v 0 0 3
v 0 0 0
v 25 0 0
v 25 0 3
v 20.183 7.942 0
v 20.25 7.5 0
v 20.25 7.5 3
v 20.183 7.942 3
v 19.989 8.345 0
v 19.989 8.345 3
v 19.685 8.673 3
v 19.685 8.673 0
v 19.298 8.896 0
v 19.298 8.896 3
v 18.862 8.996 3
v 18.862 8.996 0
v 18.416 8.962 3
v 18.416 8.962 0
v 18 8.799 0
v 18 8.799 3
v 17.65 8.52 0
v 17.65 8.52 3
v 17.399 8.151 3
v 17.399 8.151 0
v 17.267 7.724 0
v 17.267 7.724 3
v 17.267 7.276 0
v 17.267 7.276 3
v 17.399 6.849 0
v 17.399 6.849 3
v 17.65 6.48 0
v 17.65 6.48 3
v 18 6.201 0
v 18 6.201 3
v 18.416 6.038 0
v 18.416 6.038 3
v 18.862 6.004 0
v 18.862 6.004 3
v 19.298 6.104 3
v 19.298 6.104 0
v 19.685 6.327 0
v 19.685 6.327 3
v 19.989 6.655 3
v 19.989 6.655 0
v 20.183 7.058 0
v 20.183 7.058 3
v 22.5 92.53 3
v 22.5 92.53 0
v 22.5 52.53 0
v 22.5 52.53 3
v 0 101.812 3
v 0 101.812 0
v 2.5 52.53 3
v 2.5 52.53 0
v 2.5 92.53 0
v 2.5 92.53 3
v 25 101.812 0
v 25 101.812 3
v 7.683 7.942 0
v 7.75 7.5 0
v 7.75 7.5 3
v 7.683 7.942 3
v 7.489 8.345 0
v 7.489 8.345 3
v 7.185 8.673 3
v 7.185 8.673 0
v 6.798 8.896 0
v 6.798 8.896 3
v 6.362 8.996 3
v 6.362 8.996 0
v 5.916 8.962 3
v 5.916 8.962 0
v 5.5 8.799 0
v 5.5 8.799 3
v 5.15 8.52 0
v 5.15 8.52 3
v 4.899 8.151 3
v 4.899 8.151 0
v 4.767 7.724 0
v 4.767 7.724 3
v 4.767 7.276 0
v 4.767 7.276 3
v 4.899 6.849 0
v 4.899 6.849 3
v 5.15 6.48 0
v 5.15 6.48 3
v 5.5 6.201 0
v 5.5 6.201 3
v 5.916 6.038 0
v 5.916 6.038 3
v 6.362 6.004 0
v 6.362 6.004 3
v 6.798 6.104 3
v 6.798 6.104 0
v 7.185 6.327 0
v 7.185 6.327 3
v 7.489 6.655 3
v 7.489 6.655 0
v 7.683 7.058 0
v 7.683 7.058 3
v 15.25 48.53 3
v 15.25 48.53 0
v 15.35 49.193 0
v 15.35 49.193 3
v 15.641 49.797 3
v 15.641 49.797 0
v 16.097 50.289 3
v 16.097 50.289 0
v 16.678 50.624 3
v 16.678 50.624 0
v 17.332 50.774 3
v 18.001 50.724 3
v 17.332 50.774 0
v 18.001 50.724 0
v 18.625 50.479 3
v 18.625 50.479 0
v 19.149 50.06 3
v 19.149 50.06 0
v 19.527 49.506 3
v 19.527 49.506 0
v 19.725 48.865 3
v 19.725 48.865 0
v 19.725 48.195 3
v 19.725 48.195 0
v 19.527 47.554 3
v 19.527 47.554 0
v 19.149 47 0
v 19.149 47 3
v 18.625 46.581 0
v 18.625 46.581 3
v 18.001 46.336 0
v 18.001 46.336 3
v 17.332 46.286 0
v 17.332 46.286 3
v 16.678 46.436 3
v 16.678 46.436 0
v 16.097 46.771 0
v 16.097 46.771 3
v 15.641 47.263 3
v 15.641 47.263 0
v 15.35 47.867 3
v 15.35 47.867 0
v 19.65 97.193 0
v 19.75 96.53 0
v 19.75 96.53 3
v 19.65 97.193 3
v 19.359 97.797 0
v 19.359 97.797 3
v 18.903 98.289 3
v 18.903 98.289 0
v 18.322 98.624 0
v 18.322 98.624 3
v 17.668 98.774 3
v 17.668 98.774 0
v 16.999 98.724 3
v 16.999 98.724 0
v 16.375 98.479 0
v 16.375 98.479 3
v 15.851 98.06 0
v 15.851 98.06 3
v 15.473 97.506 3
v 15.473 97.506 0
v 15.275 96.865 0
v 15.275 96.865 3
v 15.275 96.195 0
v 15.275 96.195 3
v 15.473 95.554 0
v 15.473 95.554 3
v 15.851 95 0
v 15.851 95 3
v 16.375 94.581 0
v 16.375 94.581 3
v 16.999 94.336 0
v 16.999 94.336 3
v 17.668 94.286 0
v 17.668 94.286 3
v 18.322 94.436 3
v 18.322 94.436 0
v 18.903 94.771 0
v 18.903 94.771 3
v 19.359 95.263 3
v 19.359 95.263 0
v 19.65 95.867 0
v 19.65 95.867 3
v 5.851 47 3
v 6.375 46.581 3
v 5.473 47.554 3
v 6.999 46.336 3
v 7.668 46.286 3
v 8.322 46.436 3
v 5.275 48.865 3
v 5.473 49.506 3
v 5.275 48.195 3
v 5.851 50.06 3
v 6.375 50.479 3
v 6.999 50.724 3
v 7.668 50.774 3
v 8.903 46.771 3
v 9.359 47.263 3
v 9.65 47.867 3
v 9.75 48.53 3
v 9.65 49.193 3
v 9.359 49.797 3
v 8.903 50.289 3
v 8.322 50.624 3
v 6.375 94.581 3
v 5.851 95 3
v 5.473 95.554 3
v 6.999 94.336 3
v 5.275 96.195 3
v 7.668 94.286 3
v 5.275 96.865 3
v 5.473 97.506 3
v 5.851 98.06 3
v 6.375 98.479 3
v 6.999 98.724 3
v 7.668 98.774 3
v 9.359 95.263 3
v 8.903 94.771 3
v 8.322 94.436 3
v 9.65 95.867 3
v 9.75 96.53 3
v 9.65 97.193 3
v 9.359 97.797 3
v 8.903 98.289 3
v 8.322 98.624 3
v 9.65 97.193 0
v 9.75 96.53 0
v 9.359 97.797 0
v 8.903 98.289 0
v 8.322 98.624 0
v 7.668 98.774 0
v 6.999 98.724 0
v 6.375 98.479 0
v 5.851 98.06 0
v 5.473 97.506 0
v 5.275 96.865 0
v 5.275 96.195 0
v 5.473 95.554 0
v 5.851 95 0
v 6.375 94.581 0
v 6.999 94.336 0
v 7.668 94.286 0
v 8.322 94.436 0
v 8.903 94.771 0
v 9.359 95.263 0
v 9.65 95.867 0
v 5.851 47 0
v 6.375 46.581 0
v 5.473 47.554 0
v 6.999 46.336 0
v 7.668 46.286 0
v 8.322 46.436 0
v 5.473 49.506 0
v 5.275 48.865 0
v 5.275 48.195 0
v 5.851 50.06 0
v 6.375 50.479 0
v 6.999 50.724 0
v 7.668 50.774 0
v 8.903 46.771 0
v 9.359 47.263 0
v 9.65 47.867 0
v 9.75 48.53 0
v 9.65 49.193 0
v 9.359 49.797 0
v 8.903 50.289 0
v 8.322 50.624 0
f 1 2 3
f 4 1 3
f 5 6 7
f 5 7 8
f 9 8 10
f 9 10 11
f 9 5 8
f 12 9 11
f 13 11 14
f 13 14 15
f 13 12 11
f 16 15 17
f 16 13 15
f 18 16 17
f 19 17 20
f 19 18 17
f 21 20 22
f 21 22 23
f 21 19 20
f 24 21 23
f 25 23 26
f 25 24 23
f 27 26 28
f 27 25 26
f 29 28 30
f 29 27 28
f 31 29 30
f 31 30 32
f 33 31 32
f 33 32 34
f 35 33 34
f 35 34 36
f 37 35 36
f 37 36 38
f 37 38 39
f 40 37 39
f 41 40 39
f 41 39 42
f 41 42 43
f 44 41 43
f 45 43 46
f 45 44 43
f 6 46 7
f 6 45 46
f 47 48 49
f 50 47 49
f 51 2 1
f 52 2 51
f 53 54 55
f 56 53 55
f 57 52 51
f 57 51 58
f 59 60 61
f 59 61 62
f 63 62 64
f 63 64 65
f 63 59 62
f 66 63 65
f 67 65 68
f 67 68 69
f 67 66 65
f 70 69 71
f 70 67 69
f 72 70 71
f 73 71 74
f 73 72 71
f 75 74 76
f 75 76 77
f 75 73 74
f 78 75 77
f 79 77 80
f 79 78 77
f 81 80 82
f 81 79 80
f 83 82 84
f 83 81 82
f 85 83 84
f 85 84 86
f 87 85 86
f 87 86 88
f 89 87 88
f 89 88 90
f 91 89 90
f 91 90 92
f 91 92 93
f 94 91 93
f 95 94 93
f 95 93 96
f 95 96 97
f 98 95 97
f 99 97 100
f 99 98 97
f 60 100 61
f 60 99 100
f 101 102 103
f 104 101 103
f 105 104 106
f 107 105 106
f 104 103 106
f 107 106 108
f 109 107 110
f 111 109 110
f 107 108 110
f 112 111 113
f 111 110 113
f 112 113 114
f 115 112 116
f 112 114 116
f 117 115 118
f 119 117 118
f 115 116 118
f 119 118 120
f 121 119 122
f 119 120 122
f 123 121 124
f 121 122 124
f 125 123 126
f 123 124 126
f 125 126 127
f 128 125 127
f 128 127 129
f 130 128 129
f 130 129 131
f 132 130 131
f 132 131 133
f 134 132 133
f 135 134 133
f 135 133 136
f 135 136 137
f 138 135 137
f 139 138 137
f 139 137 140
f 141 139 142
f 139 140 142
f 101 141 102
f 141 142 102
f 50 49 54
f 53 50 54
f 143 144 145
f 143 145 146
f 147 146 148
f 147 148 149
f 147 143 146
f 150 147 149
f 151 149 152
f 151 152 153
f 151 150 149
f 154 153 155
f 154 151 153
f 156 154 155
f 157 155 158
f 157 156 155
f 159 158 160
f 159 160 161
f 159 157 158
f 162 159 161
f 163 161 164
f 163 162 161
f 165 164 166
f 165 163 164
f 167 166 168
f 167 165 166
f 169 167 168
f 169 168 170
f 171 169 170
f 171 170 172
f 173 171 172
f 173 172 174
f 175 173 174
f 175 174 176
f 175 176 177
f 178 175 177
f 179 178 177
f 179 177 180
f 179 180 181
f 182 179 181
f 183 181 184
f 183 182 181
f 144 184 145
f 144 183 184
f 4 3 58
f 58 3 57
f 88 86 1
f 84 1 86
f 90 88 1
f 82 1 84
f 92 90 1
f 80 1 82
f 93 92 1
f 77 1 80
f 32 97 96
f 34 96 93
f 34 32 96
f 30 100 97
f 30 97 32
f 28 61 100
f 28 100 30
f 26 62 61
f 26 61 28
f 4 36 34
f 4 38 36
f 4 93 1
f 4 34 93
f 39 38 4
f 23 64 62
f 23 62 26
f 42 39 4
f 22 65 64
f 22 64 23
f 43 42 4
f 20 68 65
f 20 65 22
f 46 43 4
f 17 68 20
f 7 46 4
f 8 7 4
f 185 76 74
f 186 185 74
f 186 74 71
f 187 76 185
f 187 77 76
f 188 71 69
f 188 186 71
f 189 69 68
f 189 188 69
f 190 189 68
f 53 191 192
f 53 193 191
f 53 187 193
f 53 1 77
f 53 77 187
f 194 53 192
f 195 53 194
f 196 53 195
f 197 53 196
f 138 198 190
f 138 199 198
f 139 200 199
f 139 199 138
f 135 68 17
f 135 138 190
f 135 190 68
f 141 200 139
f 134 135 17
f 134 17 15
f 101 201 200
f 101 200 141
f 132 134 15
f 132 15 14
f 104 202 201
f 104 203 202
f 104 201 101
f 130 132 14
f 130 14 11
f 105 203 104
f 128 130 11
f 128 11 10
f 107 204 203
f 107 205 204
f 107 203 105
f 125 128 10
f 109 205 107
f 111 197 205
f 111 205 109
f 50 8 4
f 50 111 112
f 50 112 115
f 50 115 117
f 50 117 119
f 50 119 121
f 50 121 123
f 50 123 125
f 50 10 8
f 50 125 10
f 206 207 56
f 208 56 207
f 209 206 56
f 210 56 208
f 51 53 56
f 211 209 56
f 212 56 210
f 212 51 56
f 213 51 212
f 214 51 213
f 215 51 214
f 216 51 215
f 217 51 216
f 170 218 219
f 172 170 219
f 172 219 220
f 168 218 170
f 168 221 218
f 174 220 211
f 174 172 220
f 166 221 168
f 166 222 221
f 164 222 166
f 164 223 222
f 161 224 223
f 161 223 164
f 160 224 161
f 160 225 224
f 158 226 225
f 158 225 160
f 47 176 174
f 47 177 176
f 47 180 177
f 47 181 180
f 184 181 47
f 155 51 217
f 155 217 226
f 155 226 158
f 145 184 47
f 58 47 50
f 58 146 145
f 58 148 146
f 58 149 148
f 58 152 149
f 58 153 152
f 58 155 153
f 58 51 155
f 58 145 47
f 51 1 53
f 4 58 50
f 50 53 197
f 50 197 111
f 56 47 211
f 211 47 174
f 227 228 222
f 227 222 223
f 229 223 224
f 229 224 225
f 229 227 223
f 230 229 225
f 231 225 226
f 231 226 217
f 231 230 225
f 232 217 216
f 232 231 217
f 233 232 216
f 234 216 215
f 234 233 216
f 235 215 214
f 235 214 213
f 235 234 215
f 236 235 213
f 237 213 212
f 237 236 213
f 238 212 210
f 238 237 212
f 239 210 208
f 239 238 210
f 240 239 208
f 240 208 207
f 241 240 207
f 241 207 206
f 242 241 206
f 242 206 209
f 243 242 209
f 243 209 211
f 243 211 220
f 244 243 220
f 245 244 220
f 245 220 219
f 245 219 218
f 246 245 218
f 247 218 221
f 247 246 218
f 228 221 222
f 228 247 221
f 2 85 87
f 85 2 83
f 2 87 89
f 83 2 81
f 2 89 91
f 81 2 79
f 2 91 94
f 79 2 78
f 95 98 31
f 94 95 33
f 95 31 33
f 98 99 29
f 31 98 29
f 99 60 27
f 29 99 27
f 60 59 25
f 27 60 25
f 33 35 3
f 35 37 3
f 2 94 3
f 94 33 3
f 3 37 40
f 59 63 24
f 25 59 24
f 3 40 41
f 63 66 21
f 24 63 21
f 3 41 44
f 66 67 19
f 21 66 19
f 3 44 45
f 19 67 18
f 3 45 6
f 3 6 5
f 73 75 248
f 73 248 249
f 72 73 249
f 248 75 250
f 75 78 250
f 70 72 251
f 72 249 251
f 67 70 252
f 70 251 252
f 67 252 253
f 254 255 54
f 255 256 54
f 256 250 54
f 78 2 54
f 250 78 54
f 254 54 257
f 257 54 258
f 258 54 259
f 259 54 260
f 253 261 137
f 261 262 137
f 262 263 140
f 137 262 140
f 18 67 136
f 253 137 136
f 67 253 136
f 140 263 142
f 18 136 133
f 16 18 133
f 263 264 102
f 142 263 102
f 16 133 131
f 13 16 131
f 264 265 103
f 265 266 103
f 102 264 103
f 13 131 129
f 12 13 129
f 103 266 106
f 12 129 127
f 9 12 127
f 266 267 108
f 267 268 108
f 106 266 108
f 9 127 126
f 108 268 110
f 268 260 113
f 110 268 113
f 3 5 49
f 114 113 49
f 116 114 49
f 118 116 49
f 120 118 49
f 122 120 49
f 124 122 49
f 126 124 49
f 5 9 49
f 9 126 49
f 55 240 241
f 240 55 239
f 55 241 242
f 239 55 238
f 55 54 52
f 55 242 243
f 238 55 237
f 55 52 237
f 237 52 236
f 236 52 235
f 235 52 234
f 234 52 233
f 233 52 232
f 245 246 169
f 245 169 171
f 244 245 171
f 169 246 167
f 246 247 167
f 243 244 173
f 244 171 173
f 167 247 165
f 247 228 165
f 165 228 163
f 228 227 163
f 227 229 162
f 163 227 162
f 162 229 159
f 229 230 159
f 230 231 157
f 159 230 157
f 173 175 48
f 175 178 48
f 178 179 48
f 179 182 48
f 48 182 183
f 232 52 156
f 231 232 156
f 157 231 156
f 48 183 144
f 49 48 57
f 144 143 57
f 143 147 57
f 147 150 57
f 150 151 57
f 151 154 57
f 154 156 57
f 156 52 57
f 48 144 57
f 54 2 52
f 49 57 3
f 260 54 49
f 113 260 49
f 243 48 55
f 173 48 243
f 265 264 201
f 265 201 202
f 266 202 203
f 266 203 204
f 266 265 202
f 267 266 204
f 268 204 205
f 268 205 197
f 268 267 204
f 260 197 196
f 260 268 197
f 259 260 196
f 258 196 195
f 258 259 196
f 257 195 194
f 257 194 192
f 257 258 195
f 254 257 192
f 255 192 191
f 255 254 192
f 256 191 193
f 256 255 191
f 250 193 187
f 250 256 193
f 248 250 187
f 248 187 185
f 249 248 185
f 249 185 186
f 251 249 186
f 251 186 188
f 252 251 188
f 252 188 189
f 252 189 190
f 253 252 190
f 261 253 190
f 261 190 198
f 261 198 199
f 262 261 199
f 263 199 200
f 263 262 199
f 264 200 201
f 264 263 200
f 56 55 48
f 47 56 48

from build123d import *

# Parameters (mm, degrees)
SKETCH1_W           = 25
SKETCH1_H           = 15
SKETCH1_R           = 1.5
SKETCH1_H_2         = 86.812035999
SKETCH1_R_2         = 2.25
BOSS_EXTRUDE1_DEPTH = 3


with BuildPart() as part:
    # Sketch1 → Boss-Extrude1 (new body)
    # profile 1 of 2: a face of its own
    with BuildSketch(Plane.XY):
        with Locations((12.5, 7.5)):
            Rectangle(SKETCH1_W, SKETCH1_H)
        with Locations((6.25, 7.5)):
            Circle(SKETCH1_R, mode=Mode.SUBTRACT)
        with Locations((18.75, 7.5)):
            Circle(SKETCH1_R, mode=Mode.SUBTRACT)
    # profile 2 of 2: a face of its own
    with BuildSketch(Plane.XY):
        with Locations((12.5, 58.406018)):
            Rectangle(SKETCH1_W, SKETCH1_H_2)
        with Locations((7.5, 48.53)):
            Circle(SKETCH1_R_2, mode=Mode.SUBTRACT)
        with BuildLine():
            ThreePointArc((19.75, 48.53), (17.5, 46.28), (15.25, 48.53))
            ThreePointArc((15.25, 48.53), (17.5, 50.78), (19.75, 48.53))
        make_face(mode=Mode.SUBTRACT)
        with Locations((7.5, 96.53)):
            Circle(SKETCH1_R_2, mode=Mode.SUBTRACT)
        Polygon((2.5, 52.53), (2.5, 92.53), (12.5, 92.53), (22.5, 92.53), (22.5, 52.53), (12.5, 52.53), align=None, mode=Mode.SUBTRACT)
        with Locations((17.5, 96.53)):
            Circle(SKETCH1_R_2, mode=Mode.SUBTRACT)
    extrude(amount=BOSS_EXTRUDE1_DEPTH)


solid = part.part
